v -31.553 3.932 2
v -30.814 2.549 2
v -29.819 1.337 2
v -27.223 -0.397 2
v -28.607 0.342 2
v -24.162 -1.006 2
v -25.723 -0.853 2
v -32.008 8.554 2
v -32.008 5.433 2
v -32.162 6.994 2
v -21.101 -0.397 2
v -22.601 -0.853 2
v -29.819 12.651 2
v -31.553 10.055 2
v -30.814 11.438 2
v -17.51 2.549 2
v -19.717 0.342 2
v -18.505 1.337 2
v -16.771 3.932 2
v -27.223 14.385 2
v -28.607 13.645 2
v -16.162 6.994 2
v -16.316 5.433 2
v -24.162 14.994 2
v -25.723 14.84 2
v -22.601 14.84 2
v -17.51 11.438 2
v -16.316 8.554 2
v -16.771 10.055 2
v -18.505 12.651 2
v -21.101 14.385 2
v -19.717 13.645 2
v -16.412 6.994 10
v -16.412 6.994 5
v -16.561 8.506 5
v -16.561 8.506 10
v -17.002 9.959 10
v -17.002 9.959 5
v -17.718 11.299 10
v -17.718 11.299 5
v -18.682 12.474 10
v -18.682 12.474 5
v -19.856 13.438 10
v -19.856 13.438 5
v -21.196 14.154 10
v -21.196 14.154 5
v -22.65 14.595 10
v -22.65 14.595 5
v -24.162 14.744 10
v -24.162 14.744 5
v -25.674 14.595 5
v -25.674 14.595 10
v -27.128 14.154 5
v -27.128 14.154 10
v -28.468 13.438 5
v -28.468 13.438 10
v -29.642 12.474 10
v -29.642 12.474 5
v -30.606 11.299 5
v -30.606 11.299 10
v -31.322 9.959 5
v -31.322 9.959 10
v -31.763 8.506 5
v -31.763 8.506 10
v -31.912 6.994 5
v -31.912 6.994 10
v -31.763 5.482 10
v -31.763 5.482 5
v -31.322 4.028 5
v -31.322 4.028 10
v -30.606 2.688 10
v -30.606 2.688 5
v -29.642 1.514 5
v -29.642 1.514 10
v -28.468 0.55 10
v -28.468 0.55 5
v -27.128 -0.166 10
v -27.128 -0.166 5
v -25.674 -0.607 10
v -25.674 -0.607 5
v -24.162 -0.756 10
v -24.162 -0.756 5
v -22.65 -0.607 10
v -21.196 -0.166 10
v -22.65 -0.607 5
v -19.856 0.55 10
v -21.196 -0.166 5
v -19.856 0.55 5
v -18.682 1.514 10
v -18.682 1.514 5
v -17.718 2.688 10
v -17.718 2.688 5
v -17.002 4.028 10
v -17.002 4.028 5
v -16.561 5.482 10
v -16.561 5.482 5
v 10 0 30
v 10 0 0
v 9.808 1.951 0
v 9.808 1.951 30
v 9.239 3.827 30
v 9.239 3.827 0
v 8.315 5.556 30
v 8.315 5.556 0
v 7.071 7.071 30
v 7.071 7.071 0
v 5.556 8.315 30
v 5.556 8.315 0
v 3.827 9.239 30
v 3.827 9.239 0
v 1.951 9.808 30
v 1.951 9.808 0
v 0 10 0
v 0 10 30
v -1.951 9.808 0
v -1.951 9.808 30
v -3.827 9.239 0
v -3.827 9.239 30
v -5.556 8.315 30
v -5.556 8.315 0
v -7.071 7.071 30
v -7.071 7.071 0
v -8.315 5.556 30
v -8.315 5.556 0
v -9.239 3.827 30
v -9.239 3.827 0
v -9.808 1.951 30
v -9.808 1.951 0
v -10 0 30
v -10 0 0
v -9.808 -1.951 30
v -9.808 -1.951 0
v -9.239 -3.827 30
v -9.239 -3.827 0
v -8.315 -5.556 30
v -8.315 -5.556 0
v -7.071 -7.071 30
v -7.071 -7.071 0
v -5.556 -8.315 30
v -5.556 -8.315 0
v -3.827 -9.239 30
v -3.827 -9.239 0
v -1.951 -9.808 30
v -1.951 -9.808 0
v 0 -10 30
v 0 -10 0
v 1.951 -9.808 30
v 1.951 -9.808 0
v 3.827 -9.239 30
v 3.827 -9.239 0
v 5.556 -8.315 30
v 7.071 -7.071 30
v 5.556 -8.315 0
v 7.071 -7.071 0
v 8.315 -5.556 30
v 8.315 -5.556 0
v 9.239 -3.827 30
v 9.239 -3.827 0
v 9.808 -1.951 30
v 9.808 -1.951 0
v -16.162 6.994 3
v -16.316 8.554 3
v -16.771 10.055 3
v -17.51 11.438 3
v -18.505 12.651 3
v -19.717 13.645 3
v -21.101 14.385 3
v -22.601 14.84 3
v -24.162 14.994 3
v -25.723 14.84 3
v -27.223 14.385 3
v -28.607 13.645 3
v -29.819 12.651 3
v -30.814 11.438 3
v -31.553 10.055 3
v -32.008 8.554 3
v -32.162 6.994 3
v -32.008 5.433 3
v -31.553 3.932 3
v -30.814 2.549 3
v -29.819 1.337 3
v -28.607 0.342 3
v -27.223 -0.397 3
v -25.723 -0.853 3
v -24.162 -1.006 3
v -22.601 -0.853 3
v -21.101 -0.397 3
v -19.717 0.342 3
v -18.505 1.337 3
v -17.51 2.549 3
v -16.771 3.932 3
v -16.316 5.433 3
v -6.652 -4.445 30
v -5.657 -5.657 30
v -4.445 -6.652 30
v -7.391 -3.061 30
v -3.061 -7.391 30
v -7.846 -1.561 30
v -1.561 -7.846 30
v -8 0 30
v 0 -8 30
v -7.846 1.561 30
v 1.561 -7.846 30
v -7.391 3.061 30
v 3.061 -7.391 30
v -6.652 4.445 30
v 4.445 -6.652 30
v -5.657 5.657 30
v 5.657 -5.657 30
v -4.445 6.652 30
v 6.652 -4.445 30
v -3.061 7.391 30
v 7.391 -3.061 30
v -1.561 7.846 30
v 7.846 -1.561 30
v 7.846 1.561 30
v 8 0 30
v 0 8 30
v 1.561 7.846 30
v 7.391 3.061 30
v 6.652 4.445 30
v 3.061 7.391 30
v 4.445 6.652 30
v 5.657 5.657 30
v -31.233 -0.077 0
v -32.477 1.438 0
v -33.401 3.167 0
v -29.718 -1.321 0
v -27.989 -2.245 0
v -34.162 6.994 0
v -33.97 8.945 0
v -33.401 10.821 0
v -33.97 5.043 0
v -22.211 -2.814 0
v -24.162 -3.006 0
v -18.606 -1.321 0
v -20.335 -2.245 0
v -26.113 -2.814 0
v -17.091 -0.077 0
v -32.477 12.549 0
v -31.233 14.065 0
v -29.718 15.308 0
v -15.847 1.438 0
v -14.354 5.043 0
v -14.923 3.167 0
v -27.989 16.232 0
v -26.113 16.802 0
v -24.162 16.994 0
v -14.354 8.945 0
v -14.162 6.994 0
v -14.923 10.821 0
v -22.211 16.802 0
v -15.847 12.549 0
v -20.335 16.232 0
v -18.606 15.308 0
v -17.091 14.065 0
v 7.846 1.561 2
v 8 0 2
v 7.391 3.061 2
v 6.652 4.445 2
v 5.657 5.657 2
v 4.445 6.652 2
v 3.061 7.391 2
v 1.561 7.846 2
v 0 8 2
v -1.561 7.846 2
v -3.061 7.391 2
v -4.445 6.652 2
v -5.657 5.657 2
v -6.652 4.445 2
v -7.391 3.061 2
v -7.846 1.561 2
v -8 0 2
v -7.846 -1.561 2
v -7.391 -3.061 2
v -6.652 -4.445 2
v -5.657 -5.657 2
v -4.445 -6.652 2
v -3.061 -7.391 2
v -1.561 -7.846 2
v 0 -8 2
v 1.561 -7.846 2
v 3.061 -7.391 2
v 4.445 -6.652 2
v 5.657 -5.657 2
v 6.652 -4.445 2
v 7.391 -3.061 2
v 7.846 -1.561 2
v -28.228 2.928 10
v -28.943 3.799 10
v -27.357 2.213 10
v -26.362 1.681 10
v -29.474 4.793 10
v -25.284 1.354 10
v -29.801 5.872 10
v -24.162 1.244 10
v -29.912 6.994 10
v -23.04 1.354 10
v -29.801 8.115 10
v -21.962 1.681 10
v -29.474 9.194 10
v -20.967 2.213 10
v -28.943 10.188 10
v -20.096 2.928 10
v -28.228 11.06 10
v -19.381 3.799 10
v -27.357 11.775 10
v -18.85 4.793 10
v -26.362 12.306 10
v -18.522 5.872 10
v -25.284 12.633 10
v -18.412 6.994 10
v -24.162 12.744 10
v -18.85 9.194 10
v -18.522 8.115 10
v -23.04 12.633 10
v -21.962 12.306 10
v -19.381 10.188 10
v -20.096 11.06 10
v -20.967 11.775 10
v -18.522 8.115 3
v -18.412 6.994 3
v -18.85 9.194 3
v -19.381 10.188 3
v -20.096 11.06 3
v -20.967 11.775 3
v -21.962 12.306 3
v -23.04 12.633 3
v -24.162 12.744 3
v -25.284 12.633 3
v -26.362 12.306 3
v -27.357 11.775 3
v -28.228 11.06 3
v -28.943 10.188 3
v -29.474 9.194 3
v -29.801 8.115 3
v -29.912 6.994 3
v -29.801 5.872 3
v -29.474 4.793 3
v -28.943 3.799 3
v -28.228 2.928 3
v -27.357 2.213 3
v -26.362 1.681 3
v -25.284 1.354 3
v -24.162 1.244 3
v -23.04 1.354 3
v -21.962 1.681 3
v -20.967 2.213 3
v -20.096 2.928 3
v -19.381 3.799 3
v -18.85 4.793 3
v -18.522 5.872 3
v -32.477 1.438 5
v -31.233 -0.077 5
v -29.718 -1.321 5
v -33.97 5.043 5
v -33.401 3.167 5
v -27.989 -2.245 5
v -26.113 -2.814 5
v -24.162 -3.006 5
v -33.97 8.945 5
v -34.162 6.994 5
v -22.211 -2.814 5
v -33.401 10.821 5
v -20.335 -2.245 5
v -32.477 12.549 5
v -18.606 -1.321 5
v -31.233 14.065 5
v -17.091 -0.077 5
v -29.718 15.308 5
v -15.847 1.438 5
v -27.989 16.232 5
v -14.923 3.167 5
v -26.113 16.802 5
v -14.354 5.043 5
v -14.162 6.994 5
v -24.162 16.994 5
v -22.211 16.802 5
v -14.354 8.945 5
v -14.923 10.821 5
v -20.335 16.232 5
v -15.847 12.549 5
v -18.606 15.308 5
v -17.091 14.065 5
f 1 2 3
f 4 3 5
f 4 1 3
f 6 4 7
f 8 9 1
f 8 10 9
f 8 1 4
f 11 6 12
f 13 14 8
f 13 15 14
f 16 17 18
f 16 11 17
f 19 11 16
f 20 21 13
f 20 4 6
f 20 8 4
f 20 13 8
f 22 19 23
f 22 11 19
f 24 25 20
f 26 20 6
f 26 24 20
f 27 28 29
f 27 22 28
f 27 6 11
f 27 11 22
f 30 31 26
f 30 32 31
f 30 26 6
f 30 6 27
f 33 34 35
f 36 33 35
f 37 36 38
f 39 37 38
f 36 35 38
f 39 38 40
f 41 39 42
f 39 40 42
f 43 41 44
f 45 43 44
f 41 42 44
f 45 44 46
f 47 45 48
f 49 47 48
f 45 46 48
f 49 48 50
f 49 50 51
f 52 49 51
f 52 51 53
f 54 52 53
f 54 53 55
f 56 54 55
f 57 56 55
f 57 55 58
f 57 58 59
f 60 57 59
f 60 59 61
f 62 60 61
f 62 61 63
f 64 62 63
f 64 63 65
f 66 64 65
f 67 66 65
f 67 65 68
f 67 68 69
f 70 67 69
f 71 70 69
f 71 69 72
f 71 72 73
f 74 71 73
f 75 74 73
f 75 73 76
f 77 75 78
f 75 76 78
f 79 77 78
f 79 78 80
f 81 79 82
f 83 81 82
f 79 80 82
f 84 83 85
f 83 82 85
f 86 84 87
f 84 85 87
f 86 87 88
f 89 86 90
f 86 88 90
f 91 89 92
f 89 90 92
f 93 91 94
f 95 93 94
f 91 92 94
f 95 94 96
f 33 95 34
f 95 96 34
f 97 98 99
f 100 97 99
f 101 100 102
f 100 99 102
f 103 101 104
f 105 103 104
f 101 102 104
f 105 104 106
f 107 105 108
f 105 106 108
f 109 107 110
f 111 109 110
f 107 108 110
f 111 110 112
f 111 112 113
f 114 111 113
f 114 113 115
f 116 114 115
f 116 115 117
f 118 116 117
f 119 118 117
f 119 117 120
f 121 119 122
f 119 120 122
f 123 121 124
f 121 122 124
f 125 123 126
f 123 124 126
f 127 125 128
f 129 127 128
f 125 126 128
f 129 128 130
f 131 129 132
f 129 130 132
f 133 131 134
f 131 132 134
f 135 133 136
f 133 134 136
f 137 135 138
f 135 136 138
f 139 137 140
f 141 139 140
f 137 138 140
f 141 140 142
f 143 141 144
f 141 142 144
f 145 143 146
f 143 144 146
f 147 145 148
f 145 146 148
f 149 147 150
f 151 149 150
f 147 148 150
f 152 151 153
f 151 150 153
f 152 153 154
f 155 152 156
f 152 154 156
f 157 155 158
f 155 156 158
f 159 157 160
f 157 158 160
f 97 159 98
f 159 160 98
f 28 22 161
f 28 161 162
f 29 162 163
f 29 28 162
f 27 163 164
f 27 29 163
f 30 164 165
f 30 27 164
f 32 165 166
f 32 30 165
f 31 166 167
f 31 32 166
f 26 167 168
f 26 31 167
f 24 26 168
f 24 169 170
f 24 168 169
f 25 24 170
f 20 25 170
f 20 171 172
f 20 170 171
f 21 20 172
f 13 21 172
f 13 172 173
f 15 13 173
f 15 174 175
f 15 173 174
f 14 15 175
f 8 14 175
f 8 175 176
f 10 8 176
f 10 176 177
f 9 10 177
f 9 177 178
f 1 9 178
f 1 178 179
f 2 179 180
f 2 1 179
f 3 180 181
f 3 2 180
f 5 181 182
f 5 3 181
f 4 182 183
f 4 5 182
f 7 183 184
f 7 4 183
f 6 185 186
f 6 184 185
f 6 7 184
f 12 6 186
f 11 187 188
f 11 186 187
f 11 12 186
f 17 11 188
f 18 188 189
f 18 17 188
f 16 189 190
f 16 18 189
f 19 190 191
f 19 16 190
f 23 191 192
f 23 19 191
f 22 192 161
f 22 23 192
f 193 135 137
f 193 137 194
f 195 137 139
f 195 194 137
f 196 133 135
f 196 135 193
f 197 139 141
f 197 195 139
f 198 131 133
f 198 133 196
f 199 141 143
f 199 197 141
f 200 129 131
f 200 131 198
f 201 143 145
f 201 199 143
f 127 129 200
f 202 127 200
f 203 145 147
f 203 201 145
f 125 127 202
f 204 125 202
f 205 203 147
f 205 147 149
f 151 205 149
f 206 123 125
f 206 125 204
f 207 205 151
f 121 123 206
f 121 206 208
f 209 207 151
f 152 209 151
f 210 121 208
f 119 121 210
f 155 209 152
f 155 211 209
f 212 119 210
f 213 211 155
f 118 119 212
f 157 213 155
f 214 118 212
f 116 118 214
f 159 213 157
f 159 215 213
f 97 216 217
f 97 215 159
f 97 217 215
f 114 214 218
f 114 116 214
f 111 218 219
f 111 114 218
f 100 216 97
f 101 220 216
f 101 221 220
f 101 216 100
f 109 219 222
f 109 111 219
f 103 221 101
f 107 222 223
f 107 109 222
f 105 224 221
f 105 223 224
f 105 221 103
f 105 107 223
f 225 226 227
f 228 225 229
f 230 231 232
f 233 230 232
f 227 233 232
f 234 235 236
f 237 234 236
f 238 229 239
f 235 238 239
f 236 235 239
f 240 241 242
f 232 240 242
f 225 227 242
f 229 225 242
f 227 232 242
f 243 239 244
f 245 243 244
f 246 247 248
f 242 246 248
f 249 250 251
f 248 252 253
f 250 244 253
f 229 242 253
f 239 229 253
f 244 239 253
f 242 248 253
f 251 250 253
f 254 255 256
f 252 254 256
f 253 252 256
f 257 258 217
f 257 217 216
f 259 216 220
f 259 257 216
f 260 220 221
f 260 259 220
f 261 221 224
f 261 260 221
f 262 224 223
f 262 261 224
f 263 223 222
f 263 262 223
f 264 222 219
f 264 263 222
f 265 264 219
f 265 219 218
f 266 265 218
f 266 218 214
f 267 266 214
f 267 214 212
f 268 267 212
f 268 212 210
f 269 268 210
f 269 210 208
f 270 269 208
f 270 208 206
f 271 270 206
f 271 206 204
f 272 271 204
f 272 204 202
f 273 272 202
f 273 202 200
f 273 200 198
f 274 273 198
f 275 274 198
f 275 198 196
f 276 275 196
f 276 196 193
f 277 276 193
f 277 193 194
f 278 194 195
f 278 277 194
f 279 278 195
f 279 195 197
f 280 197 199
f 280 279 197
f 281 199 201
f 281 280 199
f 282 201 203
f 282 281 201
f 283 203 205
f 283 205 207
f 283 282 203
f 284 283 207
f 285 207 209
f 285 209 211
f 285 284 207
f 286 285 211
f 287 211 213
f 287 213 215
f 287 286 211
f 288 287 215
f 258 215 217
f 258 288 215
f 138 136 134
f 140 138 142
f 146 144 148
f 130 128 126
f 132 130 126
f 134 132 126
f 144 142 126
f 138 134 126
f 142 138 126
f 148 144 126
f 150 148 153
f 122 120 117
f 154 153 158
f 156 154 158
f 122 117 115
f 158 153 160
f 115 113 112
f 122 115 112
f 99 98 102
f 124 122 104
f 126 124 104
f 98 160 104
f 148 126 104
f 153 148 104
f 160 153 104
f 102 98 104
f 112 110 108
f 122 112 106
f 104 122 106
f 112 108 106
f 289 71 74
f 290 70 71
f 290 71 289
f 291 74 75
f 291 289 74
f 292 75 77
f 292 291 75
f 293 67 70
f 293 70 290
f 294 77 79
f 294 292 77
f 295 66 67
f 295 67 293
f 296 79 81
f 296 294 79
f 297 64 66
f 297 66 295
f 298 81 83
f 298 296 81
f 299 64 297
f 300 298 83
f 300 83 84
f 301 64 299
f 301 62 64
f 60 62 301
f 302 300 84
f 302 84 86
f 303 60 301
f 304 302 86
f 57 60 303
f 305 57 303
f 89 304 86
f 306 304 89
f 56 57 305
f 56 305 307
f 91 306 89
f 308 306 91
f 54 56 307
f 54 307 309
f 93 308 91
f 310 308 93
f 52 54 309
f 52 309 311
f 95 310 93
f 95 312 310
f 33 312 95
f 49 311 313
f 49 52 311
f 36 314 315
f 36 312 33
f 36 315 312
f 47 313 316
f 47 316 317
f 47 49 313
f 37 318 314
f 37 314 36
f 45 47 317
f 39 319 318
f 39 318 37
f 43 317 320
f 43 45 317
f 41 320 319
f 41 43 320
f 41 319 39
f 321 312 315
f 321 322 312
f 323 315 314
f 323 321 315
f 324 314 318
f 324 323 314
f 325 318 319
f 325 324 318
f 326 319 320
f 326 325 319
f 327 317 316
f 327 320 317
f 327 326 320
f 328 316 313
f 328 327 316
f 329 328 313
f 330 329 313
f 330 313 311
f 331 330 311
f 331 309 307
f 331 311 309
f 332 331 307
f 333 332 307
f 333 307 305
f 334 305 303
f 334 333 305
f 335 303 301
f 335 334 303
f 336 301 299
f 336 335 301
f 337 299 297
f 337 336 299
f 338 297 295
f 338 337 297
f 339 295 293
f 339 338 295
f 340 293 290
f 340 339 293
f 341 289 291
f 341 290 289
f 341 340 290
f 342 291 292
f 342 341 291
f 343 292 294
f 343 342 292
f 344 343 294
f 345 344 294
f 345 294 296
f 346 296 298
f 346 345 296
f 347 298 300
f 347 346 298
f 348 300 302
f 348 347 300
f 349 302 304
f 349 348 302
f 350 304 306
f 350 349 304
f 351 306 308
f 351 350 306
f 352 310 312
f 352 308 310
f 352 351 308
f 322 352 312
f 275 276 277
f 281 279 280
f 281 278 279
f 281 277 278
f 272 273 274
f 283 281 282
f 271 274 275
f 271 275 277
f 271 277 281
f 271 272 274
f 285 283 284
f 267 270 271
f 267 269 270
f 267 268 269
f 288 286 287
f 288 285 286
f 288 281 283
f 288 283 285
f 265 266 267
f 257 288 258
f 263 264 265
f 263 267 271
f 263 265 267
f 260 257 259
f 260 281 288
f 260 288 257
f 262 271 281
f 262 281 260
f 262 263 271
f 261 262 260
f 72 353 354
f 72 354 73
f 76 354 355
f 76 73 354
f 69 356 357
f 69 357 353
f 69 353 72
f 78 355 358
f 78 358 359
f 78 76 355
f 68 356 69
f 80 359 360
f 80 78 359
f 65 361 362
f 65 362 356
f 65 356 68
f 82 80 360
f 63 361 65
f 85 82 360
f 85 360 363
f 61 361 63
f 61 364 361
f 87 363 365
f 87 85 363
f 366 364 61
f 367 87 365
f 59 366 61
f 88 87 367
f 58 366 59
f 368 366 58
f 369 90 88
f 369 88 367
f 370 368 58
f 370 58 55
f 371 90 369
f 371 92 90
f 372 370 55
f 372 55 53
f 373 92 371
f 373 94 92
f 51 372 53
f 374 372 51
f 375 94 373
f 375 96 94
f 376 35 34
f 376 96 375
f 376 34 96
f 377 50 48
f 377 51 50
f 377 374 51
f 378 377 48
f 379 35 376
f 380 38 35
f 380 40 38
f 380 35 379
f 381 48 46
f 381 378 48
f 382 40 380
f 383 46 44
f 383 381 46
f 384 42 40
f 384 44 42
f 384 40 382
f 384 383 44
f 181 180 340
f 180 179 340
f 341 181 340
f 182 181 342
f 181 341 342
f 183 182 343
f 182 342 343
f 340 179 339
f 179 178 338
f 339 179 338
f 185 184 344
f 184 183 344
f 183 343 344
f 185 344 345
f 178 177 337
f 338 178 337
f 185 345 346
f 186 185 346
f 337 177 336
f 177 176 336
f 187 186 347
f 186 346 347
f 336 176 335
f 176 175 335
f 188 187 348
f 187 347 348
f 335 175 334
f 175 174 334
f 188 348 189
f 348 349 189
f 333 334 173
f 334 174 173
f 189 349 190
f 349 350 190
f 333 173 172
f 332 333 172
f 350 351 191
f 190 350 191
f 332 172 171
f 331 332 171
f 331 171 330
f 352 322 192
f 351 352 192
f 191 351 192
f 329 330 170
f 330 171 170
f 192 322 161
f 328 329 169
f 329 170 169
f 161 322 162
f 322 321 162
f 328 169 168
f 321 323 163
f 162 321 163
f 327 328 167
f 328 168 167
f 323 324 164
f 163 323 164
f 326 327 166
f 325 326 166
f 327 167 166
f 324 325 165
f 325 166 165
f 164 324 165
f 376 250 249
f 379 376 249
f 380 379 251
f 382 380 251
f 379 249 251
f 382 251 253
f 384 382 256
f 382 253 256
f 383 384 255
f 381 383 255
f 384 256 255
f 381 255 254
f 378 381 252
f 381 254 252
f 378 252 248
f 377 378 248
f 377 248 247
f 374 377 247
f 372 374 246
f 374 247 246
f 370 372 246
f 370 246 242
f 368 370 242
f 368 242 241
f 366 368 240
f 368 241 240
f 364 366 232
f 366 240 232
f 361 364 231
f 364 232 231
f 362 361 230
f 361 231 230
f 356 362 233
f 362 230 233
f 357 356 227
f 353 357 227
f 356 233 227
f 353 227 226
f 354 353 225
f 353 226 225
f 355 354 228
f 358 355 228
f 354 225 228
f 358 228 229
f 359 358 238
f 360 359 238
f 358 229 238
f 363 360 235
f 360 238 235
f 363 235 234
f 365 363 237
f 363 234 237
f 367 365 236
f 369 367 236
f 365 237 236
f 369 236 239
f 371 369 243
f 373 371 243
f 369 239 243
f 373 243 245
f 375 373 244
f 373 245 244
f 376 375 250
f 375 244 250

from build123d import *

# Parameters (mm, degrees)
F0_R     = 10
F1_DEPTH = 30
F2_T     = -2
F3_R     = 7.75
F4_DEPTH = 10
F3_R_2   = 10
F5_DEPTH = 5
F6_T     = -2


with BuildPart() as f1:
    # F0 (on Top) → F1 (new body)
    with BuildSketch(Plane.XY):
        Circle(F0_R)
    extrude(amount=F1_DEPTH)

    # F2
    f2_openings = [f1.faces().sort_by_distance(p)[0] for p in [
        (0, 0, 30),
    ]]
    offset(amount=F2_T, openings=f2_openings)


with BuildPart() as f4:
    # F3 (on Top) → F4 (new body)
    with BuildSketch(Plane.XY):
        with Locations((-24.1619775113, 6.9936937847)):
            Circle(F3_R)
    extrude(amount=F4_DEPTH)

    # F3 (on Top) → F5 (join)
    with BuildSketch(Plane.XY):
        with Locations((-24.1619775113, 6.9936937847)):
            Circle(F3_R_2)
        with Locations((-24.1619775113, 6.9936937847)):
            Circle(F3_R, mode=Mode.SUBTRACT)
    extrude(amount=F5_DEPTH)

    # F6
    f6_openings = [f4.faces().sort_by_distance(p)[0] for p in [
        (-24.161978, 6.993694, 10),
    ]]
    offset(amount=F6_T, openings=f6_openings, kind=Kind.INTERSECTION)


solid = Compound([f1.part, f4.part])
